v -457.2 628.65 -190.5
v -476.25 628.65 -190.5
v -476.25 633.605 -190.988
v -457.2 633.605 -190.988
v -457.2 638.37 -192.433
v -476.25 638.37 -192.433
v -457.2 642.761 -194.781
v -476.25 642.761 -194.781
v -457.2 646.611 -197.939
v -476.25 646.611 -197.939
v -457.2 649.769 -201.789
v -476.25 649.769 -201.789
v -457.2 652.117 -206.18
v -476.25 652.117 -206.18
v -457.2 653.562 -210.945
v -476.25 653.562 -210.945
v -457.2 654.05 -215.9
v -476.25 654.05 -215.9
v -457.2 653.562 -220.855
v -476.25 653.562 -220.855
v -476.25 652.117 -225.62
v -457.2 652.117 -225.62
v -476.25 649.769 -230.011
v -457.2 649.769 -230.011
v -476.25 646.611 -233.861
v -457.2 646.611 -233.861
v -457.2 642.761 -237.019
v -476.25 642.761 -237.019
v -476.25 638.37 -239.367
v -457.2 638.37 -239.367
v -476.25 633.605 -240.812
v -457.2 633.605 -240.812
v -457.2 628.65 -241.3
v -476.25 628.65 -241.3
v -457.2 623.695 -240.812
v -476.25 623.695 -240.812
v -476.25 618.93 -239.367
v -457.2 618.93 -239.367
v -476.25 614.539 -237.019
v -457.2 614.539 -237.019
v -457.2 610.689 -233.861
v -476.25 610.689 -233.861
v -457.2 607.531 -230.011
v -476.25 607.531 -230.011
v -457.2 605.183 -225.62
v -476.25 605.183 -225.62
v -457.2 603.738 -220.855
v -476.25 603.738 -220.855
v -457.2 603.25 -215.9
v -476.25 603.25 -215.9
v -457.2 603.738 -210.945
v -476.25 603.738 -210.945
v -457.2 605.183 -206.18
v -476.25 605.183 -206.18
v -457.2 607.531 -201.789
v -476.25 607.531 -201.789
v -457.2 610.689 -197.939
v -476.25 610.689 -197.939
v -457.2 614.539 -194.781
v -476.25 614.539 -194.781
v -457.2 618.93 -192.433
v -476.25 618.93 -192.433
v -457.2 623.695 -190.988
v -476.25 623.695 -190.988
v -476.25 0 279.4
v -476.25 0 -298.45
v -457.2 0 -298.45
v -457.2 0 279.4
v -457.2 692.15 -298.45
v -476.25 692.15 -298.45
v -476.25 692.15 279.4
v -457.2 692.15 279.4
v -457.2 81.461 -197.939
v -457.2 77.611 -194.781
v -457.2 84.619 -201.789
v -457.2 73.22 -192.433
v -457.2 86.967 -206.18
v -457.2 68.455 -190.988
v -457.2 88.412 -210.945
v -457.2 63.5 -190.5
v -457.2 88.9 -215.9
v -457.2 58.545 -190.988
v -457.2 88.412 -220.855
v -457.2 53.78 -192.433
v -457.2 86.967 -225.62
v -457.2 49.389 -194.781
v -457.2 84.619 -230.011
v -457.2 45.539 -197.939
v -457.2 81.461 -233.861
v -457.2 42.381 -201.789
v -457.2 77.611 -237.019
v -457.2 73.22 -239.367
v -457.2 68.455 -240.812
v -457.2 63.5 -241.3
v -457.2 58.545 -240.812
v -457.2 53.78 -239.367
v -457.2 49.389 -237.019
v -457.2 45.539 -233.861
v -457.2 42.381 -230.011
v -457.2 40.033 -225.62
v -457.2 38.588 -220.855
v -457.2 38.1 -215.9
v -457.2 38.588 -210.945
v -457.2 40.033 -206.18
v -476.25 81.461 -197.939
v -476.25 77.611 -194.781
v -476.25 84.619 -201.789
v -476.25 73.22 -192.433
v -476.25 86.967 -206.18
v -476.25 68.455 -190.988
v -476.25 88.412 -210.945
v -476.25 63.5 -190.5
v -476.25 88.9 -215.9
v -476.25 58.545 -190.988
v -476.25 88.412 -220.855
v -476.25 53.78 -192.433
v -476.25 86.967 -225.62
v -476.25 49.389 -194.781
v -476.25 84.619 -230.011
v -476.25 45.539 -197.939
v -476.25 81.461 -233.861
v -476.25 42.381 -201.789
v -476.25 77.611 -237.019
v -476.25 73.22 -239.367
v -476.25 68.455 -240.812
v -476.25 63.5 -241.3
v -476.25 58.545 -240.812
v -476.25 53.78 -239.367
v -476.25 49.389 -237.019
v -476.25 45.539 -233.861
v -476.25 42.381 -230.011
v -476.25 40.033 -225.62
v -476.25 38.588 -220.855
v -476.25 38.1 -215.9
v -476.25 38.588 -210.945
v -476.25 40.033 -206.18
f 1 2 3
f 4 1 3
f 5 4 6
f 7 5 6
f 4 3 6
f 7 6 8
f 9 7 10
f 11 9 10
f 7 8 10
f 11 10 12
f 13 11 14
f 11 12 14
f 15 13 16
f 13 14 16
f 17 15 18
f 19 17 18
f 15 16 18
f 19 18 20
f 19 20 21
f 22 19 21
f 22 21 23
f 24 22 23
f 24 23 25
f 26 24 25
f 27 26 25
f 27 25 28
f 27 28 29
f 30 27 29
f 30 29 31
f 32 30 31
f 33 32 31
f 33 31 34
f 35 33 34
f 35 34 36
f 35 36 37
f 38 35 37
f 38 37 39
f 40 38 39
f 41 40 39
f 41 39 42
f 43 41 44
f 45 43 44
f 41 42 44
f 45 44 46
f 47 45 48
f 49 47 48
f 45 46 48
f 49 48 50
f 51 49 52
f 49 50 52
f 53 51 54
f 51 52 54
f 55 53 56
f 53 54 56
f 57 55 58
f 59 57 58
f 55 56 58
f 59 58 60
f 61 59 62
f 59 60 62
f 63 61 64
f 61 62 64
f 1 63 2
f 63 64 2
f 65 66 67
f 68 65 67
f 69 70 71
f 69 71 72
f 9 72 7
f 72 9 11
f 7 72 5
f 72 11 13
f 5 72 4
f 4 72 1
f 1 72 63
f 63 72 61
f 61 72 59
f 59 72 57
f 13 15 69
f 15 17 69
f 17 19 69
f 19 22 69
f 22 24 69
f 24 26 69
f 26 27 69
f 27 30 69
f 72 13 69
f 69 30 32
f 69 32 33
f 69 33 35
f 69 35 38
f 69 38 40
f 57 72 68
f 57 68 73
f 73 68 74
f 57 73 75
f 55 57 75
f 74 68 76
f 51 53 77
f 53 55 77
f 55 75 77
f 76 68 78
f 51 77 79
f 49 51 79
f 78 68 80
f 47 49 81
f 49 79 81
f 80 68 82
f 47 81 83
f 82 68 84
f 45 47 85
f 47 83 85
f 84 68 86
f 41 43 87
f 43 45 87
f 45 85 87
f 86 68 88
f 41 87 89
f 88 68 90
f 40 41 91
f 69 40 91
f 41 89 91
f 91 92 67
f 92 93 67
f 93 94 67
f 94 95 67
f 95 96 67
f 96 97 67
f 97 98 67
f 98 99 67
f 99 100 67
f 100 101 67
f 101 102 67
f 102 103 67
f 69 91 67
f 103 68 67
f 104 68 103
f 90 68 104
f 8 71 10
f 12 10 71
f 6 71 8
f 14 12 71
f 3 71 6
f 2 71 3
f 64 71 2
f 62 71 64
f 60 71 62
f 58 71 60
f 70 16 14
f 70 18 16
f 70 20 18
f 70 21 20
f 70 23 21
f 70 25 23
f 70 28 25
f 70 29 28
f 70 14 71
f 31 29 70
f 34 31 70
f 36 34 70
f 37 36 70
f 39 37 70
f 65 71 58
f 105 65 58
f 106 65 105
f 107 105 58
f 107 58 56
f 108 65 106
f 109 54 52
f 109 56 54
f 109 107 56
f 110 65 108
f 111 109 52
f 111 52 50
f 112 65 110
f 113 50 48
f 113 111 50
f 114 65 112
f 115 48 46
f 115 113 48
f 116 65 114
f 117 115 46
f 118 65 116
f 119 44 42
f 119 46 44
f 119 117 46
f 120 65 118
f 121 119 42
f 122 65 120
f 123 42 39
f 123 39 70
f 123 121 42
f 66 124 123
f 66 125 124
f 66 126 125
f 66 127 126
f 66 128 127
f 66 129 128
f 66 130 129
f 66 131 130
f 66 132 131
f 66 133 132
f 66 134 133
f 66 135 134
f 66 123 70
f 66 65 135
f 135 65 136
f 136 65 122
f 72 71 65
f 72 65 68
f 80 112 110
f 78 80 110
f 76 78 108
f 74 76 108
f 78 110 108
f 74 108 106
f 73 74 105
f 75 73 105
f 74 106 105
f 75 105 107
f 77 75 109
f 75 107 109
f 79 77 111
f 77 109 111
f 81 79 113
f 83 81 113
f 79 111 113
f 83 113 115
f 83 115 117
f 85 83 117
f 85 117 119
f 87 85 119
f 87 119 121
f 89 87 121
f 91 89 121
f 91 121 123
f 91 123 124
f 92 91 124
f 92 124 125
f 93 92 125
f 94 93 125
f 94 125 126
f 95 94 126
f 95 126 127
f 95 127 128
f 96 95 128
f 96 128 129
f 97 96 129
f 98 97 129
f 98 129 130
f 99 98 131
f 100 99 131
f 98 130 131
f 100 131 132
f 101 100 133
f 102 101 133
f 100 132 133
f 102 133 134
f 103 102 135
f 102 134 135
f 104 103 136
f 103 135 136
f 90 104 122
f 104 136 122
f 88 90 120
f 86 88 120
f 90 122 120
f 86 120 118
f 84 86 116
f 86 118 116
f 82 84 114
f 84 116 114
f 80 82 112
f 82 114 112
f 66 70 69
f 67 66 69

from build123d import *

# Parameters (mm, degrees)
SKETCH1_W           = 19.05
SKETCH1_H           = 577.85
BOSS_EXTRUDE1_DEPTH = 692.15
SKETCH2_R           = 25.4
CUT_EXTRUDE1_DEPTH  = 754.993983729


with BuildPart() as part:
    # Sketch1 → Boss-Extrude1 (new body)
    with BuildSketch(Plane(origin=(0, 0, 0), x_dir=(1, 0, 0), z_dir=(0, 1, 0))):
        with Locations((-466.725, 9.525)):
            Rectangle(SKETCH1_W, SKETCH1_H)
    extrude(amount=BOSS_EXTRUDE1_DEPTH)

    # Sketch2 → Cut-Extrude1 (cut, through all)
    with BuildSketch(Plane.ZY.offset(476.25)):
        with Locations((-215.9, 628.65)):
            Circle(SKETCH2_R)
        with Locations((-215.9, 63.5)):
            Circle(SKETCH2_R)
    extrude(amount=-CUT_EXTRUDE1_DEPTH, mode=Mode.SUBTRACT)


solid = part.part
